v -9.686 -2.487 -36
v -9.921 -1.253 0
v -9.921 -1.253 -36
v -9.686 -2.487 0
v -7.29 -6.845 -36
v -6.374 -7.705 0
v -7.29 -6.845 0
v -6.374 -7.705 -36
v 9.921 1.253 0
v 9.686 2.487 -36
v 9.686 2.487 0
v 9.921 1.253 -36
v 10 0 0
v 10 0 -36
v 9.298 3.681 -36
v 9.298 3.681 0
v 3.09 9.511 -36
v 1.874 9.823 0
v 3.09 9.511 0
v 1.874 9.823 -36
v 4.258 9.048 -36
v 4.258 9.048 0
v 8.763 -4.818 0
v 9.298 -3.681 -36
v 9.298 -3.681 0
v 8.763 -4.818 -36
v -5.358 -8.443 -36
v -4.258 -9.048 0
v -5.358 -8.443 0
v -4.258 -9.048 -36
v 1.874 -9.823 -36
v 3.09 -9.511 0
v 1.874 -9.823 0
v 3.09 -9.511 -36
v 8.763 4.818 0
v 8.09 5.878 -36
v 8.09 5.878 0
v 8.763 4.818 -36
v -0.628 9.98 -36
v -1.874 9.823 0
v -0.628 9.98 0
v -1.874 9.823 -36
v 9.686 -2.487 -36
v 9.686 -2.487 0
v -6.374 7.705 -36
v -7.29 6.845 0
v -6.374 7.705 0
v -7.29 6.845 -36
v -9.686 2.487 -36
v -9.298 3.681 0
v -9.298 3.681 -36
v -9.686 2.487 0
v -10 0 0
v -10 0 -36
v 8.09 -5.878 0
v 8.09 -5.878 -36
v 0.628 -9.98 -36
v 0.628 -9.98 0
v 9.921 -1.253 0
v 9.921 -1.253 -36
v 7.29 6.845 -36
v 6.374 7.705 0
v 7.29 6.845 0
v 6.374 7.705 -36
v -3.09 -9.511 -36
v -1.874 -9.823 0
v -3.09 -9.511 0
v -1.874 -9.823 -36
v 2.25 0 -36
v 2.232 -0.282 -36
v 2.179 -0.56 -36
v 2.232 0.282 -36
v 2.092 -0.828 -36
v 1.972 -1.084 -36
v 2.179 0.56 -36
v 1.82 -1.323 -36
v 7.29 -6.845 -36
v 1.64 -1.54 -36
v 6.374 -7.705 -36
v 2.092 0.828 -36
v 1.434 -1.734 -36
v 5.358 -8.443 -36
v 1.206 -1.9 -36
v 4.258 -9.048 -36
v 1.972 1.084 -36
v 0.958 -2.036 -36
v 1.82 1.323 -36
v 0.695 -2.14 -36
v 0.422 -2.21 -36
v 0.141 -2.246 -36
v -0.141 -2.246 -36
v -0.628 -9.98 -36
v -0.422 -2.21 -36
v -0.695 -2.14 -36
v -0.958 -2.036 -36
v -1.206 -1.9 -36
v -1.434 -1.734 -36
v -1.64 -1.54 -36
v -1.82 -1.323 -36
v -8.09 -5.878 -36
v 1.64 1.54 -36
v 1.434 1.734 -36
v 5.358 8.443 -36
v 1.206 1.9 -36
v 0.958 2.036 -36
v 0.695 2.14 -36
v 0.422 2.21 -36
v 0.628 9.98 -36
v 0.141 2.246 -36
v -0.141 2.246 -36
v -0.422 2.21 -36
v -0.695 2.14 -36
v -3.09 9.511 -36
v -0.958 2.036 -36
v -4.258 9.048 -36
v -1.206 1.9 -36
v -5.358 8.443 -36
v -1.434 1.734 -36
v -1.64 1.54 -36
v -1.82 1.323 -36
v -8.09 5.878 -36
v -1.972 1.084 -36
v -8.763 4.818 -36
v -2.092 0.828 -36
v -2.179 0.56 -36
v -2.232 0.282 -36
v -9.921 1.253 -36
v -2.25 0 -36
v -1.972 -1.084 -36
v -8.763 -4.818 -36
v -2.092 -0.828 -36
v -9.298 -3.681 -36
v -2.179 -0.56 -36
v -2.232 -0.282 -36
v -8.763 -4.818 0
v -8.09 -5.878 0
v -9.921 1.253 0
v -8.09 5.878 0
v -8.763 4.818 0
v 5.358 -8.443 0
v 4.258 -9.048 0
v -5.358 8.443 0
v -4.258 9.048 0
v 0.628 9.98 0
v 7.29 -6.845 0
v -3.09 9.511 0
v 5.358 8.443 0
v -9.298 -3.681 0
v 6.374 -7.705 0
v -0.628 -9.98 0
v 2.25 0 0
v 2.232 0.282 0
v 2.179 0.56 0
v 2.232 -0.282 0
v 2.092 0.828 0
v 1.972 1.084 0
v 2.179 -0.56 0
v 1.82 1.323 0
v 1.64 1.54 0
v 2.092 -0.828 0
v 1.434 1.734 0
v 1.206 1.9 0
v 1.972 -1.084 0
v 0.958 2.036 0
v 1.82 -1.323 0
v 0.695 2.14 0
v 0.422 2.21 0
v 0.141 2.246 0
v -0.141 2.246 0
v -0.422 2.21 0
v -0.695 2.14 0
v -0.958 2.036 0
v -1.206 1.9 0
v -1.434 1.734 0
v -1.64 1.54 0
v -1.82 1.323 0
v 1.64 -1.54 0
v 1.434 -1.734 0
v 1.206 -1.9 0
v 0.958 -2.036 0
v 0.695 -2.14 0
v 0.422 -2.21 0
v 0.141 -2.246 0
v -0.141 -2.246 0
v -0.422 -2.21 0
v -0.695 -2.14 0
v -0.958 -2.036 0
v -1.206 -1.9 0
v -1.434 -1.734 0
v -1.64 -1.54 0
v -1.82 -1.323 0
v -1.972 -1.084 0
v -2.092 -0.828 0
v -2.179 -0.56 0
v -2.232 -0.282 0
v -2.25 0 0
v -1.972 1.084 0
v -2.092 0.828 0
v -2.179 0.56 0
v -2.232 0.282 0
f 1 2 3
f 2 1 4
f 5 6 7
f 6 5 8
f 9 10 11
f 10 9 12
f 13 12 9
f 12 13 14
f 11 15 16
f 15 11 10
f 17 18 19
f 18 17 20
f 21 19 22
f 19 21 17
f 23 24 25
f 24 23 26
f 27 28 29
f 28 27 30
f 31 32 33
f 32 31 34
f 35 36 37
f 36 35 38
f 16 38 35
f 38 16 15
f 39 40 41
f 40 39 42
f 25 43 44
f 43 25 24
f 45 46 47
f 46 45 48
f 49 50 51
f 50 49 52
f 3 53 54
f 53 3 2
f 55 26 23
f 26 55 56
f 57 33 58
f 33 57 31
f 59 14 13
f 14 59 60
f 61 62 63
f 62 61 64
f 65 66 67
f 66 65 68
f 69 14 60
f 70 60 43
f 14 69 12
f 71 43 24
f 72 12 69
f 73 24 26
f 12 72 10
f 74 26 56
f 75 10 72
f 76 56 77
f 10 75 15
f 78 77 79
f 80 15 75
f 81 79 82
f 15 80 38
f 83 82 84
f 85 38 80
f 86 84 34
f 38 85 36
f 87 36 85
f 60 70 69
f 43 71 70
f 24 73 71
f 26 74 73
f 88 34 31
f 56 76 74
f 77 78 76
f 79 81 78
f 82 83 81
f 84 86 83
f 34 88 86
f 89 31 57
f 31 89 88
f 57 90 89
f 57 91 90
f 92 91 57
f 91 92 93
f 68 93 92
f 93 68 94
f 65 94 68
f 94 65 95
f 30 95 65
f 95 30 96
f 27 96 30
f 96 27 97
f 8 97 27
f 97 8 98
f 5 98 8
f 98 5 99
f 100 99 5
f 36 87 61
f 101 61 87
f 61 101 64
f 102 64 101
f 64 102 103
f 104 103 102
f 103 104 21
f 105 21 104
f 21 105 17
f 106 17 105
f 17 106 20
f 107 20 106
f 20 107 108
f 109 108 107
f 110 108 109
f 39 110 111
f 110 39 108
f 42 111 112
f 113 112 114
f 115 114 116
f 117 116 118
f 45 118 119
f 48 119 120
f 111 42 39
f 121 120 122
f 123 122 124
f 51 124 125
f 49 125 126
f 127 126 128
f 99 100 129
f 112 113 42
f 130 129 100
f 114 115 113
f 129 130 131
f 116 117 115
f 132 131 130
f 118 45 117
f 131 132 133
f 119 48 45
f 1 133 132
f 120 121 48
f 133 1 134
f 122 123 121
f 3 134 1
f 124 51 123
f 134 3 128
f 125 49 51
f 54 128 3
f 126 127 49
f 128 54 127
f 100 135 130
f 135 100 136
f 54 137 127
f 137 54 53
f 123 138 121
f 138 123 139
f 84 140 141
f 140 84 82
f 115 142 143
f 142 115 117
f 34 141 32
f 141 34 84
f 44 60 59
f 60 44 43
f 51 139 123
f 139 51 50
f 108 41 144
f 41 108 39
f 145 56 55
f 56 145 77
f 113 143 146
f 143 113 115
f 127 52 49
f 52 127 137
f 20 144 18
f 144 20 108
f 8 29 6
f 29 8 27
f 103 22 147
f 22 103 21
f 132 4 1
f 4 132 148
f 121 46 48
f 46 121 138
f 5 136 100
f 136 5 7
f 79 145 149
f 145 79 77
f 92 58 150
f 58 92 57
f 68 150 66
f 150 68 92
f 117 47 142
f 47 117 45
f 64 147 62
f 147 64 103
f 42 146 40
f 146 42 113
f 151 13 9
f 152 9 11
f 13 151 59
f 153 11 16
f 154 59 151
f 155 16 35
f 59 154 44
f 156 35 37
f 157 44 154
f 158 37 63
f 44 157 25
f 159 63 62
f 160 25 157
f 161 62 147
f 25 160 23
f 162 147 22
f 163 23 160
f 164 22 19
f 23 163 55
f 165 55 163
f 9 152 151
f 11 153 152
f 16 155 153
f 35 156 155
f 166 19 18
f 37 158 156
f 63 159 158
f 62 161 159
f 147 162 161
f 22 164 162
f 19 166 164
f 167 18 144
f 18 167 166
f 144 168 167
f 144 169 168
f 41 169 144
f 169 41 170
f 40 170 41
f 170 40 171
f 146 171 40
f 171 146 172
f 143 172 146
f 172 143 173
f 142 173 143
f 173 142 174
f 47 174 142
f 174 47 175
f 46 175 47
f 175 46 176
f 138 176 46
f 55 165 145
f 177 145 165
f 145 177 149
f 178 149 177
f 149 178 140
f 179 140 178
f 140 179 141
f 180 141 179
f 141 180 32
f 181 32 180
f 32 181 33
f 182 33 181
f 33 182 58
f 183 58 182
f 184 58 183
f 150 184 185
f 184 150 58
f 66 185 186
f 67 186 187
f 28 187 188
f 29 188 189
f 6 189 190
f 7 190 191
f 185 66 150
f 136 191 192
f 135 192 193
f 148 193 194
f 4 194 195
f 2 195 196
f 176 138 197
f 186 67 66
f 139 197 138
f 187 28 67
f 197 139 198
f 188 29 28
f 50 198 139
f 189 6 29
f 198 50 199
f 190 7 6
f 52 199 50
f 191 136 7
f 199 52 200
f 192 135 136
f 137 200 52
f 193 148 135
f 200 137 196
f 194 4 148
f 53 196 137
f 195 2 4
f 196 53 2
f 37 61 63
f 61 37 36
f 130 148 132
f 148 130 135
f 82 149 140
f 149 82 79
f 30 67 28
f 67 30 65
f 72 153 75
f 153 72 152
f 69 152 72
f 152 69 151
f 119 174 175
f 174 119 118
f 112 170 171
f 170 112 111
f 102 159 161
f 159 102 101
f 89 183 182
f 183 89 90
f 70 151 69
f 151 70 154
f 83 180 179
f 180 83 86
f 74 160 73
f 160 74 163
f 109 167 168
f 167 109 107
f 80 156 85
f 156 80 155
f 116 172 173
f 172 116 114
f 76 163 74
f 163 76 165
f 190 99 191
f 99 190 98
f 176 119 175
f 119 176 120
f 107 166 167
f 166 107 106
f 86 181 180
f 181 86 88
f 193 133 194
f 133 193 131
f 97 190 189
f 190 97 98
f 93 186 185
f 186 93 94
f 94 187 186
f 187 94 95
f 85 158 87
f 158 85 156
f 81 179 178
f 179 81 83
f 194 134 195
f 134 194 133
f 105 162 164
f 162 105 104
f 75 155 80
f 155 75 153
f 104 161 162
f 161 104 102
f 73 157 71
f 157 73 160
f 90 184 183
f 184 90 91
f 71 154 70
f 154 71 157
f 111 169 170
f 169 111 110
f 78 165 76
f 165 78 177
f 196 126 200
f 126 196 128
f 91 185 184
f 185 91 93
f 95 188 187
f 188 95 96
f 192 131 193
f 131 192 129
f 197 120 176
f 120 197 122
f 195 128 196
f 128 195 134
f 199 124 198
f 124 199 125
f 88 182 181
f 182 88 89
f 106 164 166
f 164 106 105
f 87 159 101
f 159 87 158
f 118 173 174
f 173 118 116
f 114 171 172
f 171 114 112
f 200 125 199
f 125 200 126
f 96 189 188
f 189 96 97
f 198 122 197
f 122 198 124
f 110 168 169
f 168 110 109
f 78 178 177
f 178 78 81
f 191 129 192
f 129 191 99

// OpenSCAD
$fn = 50;


difference() {
	union() {
		translate(v = [0, 0, -36.0000000000]) {
			cylinder(h = 36, r = 10.0000000000);
		}
		cylinder(h = 0, r = 13.0000000000);
	}
	union() {
		#translate(v = [0, 0, -36]) {
			cylinder(h = 36, r = 2.2500000000);
		}
	}
}
